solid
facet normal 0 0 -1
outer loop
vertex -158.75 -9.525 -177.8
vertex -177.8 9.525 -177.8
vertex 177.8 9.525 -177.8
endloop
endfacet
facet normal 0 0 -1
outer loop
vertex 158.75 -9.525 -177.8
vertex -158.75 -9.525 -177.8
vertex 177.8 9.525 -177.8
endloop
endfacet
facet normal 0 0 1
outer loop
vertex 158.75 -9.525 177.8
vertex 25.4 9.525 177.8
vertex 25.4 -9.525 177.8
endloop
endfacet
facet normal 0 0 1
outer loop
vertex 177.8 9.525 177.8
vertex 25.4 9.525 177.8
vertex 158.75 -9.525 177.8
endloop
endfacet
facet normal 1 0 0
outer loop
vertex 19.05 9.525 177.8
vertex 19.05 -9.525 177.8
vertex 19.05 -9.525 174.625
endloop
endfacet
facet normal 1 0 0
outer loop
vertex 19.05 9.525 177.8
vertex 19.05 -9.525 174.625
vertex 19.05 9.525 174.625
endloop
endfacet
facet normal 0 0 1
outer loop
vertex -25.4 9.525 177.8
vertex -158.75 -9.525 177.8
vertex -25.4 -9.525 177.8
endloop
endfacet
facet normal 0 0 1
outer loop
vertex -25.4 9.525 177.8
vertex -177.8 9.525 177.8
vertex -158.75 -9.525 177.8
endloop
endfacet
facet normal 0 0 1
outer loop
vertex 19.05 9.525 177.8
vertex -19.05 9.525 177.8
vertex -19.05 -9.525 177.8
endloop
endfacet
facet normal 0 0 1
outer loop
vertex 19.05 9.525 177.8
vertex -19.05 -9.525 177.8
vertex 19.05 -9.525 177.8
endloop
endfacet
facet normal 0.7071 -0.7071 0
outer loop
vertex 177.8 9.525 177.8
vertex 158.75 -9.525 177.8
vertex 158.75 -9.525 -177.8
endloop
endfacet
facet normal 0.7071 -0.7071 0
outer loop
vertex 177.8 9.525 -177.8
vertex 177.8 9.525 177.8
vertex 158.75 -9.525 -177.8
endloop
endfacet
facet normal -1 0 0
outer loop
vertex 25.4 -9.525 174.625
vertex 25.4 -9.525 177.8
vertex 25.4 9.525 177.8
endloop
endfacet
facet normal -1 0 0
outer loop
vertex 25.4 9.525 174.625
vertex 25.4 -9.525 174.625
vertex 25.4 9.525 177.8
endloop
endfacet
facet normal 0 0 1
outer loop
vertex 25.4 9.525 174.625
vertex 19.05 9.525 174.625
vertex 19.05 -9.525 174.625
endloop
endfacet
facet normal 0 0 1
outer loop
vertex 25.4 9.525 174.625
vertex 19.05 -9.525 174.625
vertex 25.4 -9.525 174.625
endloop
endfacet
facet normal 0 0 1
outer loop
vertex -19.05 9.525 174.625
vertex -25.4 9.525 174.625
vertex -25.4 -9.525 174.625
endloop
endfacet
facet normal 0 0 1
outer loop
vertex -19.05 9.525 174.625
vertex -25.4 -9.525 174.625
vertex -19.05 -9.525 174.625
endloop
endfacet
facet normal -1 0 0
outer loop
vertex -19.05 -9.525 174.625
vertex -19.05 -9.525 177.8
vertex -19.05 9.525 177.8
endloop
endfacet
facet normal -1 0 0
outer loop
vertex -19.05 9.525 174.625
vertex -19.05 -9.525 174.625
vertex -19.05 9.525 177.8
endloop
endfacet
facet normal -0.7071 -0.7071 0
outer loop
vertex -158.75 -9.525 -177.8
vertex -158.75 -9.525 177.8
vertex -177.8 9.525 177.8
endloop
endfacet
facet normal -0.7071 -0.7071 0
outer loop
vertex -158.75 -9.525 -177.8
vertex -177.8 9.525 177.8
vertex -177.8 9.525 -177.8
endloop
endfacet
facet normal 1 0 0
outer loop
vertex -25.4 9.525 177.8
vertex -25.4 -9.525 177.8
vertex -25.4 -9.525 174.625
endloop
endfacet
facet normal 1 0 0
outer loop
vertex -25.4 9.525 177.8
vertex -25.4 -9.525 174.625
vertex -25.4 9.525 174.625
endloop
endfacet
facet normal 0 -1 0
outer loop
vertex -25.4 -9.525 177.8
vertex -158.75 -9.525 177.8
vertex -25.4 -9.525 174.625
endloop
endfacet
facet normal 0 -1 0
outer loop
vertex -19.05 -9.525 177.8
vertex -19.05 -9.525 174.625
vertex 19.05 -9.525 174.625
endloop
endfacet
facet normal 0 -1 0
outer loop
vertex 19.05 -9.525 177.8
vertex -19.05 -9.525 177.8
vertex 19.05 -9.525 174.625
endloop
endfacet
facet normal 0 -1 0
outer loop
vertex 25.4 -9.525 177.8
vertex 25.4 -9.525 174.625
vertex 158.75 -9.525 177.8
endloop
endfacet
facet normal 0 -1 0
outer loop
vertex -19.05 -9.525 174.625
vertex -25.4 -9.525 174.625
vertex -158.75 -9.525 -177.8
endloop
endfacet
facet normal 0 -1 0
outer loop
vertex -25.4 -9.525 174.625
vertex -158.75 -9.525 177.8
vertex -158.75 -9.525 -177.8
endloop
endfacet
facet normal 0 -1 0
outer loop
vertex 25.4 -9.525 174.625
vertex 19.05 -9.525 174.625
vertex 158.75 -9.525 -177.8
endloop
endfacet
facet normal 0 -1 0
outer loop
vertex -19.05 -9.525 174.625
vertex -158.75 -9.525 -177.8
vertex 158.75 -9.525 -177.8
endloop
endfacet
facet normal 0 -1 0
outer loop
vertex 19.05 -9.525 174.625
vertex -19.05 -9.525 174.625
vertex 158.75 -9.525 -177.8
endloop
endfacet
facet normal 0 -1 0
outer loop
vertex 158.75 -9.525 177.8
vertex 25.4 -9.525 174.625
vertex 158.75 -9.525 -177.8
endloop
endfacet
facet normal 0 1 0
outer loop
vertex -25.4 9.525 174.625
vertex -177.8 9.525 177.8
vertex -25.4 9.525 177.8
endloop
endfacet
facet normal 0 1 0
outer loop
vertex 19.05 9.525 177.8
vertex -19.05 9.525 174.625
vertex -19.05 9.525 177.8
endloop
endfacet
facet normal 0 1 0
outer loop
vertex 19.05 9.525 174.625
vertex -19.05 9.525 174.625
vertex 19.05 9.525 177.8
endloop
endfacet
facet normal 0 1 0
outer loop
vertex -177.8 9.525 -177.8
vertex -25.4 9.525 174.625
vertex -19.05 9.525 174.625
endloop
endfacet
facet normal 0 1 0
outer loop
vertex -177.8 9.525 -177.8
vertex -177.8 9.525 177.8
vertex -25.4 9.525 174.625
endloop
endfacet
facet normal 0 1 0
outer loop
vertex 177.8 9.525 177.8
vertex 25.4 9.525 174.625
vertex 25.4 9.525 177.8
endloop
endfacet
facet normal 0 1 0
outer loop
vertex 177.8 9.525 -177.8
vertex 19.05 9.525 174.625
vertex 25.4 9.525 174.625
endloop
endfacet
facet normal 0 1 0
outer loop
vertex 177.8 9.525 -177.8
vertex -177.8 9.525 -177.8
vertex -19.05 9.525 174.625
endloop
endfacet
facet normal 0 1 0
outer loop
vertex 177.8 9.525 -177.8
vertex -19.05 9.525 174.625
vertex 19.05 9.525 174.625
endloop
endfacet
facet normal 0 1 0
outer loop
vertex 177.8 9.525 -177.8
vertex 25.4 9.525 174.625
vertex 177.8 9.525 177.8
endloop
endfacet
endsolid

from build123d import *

# Parameters (mm, degrees)
SKETCH1_W           = 355.6
SKETCH1_H           = 355.6
BOSS_EXTRUDE1_DEPTH = 9.525
CHAMFER1_SIZE       = 19.05
SKETCH2_W           = 6.35
SKETCH2_H           = 19.05
CUT_EXTRUDE1_DEPTH  = 3.175


with BuildPart() as part:
    # Sketch1 → Boss-Extrude1 (new, symmetric)
    with BuildSketch(Plane(origin=(0, 0, 0), x_dir=(1, 0, 0), z_dir=(0, 1, 0))):
        Rectangle(SKETCH1_W, SKETCH1_H)
    extrude(amount=BOSS_EXTRUDE1_DEPTH, both=True)

    # Chamfer1
    chamfer1_edges = [part.edges().sort_by_distance(p)[0] for p in [
        (177.8, -9.525, 0),
        (-177.8, -9.525, 0),
    ]]
    chamfer(chamfer1_edges, length=CHAMFER1_SIZE - 0.0001)  # a hair under: the kernel refuses the full size

    # Sketch2 → Cut-Extrude1 (cut)
    with BuildSketch(Plane.XY.offset(177.8)):
        with Locations((22.225, 0)):
            Rectangle(SKETCH2_W, SKETCH2_H)
        with Locations((-22.225, 0)):
            Rectangle(SKETCH2_W, SKETCH2_H)
    extrude(amount=-CUT_EXTRUDE1_DEPTH, mode=Mode.SUBTRACT)


solid = part.part
